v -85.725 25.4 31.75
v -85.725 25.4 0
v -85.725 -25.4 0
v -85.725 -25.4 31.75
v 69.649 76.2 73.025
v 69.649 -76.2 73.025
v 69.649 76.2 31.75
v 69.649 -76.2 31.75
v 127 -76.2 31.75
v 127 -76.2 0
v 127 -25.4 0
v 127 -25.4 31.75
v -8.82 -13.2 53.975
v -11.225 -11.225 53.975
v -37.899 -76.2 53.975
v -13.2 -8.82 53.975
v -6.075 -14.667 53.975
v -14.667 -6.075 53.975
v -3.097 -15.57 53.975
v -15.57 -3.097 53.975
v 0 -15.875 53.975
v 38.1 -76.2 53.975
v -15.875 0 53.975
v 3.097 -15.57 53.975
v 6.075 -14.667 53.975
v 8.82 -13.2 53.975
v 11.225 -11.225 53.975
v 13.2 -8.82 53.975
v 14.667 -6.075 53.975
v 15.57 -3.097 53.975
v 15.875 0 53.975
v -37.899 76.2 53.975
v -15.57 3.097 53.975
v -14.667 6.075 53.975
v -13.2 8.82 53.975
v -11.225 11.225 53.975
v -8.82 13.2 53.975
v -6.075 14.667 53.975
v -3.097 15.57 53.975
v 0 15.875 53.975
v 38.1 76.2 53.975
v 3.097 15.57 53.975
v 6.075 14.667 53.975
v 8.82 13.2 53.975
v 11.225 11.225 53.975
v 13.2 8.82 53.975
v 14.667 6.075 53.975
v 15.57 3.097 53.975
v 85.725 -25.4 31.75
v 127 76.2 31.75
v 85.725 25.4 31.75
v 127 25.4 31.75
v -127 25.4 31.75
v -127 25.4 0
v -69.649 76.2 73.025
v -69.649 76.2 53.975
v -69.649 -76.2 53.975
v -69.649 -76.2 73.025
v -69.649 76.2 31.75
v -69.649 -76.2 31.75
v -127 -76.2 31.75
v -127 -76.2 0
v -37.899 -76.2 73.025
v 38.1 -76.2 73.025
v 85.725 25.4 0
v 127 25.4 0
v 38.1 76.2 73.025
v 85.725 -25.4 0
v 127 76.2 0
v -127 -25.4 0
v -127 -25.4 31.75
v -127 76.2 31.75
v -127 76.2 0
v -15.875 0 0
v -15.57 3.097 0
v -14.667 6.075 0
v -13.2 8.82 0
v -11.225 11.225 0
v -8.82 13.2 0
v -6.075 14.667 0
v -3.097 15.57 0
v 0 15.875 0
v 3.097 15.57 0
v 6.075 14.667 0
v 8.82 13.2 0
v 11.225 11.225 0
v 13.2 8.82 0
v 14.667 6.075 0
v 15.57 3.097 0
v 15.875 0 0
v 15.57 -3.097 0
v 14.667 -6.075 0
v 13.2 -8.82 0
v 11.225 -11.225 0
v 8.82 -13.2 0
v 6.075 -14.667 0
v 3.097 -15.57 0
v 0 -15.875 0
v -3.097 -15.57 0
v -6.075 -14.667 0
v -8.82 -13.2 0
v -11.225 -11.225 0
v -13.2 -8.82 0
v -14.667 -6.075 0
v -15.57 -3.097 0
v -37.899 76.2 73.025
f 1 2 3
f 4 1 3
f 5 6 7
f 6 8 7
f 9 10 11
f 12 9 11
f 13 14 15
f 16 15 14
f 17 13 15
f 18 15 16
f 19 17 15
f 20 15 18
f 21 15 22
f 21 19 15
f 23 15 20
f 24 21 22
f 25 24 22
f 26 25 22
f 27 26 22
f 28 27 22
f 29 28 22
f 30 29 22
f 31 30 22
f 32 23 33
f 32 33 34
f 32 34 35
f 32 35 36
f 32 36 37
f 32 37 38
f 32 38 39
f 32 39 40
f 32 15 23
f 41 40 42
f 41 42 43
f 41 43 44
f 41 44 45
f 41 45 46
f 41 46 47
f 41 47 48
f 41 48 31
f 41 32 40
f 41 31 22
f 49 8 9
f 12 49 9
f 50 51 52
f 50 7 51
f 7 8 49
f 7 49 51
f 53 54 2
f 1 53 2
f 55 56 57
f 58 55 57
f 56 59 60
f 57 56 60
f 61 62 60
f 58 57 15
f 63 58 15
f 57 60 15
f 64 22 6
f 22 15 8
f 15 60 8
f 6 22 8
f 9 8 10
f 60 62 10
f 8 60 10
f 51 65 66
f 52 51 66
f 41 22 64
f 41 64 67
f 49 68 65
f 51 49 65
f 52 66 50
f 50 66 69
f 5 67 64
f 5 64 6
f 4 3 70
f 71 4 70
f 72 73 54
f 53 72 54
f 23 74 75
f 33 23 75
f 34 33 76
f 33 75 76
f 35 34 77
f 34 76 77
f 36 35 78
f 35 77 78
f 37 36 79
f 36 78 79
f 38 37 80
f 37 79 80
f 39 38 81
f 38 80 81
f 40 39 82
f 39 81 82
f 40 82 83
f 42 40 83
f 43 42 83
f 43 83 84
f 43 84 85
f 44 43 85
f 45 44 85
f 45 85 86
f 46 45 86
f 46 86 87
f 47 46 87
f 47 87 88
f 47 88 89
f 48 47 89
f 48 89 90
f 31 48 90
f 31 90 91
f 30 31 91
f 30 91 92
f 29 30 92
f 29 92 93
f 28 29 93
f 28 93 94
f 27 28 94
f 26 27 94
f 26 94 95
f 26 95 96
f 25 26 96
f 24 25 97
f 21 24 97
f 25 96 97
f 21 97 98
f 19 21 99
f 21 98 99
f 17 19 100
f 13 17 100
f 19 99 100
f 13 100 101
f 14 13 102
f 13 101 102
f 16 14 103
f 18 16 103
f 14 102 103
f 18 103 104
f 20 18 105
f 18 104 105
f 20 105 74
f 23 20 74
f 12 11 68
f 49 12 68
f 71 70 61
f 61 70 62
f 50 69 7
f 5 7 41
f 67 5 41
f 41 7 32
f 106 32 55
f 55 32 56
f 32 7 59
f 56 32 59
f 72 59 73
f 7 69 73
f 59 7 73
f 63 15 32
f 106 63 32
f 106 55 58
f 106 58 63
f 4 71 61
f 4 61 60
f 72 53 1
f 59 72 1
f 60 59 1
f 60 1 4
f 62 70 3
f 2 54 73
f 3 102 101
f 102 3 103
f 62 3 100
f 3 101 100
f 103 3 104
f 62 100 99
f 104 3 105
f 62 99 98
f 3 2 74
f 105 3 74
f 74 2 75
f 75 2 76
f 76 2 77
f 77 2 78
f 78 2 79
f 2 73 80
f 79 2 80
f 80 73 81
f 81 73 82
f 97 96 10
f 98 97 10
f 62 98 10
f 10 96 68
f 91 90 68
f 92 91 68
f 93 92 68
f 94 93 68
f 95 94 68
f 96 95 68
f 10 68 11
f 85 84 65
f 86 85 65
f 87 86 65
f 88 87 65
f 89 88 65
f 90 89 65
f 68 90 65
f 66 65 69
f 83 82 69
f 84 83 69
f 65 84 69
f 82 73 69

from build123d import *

# Parameters (mm, degrees)
F1_DEPTH  = 31.75
F2_W      = 69.6489959955
F2_H      = 152.4
F3_DEPTH  = 22.225
F4_W      = 31.5489959955
F4_H      = 152.4
F5_DEPTH  = 19.05
F6_W      = 31.5489959955
F6_H      = 31.75
F7_DEPTH  = 19.05
F9_D      = 31.75
F10_DEPTH = 19.05
F11_DEPTH = 19.05
F12_DEPTH = 19.05


# Not quite as in the source:
# - a feature names something its author has since deleted; it is built from what else it names


with BuildPart() as f1:
    # F0 (on Top) → F1 (new body)
    with BuildSketch(Plane.XY):
        Polygon((0, -76.2), (0, 76.2), (-127, 76.2), (-127, 25.4), (-85.725, 25.4), (-85.725, -25.4), (-127, -25.4), (-127, -76.2), align=None)
        Polygon((127, 25.4), (127, 76.2), (0, 76.2), (0, -76.2), (127, -76.2), (127, -25.4), (85.725, -25.4), (85.725, 25.4), align=None)
    extrude(amount=F1_DEPTH)

    # F2 (on face) → F3 (join)
    with BuildSketch(Plane.XY.offset(31.75)):
        with Locations((34.8244979978, 0)):
            Rectangle(F2_W, F2_H)
        with Locations((-34.8244979978, 0)):
            Rectangle(F2_W, F2_H)
    extrude(amount=F3_DEPTH)

    # F4 (on face) → F5 (join)
    with BuildSketch(Plane.XY.offset(53.975)):
        with Locations((53.8744979978, 0)):
            Rectangle(F4_W, F4_H)
    extrude(amount=F5_DEPTH)

    # F6 (on face) → F7 (join)
    with BuildSketch(Plane.XY):
        with Locations((53.8744979978, -60.325)):
            Rectangle(F6_W, F6_H)
        with Locations((-53.8744979978, -60.325)):
            Rectangle(F6_W, F6_H)
        with Locations((-53.8744979978, 60.325)):
            Rectangle(F6_W, F6_H)
        with Locations((53.8744979978, 60.325)):
            Rectangle(F6_W, F6_H)
    extrude(amount=F7_DEPTH)

    # F9 (through all)
    with Locations(Plane.XY.offset(53.975)):
        with Locations((0, 0)):
            Hole(F9_D / 2)

    # F6 (on face) → F10 (join)
    with BuildSketch(Plane.XY):
        with Locations((53.8744979978, 60.325)):
            Rectangle(F6_W, F6_H)
        with Locations((-53.8744979978, 60.325)):
            Rectangle(F6_W, F6_H)
        with Locations((-53.8744979978, -60.325)):
            Rectangle(F6_W, F6_H)
        with Locations((53.8744979978, -60.325)):
            Rectangle(F6_W, F6_H)
    extrude(amount=F10_DEPTH)

    # F4 (on face) → F11 (join)
    with BuildSketch(Plane.XY.offset(53.975)):
        with Locations((53.8744979978, 0)):
            Rectangle(F4_W, F4_H)
    extrude(amount=F11_DEPTH)

    # F4 (on face) → F12 (join)
    with BuildSketch(Plane.XY.offset(53.975)):
        Polygon((-37.8989959955, -76.2), (-37.8989959955, 76.2), (-69.6489959955, 76.2), (-69.6489959955, -76.2), (-38.1, -76.2), align=None)
    extrude(amount=F12_DEPTH)


solid = f1.part
